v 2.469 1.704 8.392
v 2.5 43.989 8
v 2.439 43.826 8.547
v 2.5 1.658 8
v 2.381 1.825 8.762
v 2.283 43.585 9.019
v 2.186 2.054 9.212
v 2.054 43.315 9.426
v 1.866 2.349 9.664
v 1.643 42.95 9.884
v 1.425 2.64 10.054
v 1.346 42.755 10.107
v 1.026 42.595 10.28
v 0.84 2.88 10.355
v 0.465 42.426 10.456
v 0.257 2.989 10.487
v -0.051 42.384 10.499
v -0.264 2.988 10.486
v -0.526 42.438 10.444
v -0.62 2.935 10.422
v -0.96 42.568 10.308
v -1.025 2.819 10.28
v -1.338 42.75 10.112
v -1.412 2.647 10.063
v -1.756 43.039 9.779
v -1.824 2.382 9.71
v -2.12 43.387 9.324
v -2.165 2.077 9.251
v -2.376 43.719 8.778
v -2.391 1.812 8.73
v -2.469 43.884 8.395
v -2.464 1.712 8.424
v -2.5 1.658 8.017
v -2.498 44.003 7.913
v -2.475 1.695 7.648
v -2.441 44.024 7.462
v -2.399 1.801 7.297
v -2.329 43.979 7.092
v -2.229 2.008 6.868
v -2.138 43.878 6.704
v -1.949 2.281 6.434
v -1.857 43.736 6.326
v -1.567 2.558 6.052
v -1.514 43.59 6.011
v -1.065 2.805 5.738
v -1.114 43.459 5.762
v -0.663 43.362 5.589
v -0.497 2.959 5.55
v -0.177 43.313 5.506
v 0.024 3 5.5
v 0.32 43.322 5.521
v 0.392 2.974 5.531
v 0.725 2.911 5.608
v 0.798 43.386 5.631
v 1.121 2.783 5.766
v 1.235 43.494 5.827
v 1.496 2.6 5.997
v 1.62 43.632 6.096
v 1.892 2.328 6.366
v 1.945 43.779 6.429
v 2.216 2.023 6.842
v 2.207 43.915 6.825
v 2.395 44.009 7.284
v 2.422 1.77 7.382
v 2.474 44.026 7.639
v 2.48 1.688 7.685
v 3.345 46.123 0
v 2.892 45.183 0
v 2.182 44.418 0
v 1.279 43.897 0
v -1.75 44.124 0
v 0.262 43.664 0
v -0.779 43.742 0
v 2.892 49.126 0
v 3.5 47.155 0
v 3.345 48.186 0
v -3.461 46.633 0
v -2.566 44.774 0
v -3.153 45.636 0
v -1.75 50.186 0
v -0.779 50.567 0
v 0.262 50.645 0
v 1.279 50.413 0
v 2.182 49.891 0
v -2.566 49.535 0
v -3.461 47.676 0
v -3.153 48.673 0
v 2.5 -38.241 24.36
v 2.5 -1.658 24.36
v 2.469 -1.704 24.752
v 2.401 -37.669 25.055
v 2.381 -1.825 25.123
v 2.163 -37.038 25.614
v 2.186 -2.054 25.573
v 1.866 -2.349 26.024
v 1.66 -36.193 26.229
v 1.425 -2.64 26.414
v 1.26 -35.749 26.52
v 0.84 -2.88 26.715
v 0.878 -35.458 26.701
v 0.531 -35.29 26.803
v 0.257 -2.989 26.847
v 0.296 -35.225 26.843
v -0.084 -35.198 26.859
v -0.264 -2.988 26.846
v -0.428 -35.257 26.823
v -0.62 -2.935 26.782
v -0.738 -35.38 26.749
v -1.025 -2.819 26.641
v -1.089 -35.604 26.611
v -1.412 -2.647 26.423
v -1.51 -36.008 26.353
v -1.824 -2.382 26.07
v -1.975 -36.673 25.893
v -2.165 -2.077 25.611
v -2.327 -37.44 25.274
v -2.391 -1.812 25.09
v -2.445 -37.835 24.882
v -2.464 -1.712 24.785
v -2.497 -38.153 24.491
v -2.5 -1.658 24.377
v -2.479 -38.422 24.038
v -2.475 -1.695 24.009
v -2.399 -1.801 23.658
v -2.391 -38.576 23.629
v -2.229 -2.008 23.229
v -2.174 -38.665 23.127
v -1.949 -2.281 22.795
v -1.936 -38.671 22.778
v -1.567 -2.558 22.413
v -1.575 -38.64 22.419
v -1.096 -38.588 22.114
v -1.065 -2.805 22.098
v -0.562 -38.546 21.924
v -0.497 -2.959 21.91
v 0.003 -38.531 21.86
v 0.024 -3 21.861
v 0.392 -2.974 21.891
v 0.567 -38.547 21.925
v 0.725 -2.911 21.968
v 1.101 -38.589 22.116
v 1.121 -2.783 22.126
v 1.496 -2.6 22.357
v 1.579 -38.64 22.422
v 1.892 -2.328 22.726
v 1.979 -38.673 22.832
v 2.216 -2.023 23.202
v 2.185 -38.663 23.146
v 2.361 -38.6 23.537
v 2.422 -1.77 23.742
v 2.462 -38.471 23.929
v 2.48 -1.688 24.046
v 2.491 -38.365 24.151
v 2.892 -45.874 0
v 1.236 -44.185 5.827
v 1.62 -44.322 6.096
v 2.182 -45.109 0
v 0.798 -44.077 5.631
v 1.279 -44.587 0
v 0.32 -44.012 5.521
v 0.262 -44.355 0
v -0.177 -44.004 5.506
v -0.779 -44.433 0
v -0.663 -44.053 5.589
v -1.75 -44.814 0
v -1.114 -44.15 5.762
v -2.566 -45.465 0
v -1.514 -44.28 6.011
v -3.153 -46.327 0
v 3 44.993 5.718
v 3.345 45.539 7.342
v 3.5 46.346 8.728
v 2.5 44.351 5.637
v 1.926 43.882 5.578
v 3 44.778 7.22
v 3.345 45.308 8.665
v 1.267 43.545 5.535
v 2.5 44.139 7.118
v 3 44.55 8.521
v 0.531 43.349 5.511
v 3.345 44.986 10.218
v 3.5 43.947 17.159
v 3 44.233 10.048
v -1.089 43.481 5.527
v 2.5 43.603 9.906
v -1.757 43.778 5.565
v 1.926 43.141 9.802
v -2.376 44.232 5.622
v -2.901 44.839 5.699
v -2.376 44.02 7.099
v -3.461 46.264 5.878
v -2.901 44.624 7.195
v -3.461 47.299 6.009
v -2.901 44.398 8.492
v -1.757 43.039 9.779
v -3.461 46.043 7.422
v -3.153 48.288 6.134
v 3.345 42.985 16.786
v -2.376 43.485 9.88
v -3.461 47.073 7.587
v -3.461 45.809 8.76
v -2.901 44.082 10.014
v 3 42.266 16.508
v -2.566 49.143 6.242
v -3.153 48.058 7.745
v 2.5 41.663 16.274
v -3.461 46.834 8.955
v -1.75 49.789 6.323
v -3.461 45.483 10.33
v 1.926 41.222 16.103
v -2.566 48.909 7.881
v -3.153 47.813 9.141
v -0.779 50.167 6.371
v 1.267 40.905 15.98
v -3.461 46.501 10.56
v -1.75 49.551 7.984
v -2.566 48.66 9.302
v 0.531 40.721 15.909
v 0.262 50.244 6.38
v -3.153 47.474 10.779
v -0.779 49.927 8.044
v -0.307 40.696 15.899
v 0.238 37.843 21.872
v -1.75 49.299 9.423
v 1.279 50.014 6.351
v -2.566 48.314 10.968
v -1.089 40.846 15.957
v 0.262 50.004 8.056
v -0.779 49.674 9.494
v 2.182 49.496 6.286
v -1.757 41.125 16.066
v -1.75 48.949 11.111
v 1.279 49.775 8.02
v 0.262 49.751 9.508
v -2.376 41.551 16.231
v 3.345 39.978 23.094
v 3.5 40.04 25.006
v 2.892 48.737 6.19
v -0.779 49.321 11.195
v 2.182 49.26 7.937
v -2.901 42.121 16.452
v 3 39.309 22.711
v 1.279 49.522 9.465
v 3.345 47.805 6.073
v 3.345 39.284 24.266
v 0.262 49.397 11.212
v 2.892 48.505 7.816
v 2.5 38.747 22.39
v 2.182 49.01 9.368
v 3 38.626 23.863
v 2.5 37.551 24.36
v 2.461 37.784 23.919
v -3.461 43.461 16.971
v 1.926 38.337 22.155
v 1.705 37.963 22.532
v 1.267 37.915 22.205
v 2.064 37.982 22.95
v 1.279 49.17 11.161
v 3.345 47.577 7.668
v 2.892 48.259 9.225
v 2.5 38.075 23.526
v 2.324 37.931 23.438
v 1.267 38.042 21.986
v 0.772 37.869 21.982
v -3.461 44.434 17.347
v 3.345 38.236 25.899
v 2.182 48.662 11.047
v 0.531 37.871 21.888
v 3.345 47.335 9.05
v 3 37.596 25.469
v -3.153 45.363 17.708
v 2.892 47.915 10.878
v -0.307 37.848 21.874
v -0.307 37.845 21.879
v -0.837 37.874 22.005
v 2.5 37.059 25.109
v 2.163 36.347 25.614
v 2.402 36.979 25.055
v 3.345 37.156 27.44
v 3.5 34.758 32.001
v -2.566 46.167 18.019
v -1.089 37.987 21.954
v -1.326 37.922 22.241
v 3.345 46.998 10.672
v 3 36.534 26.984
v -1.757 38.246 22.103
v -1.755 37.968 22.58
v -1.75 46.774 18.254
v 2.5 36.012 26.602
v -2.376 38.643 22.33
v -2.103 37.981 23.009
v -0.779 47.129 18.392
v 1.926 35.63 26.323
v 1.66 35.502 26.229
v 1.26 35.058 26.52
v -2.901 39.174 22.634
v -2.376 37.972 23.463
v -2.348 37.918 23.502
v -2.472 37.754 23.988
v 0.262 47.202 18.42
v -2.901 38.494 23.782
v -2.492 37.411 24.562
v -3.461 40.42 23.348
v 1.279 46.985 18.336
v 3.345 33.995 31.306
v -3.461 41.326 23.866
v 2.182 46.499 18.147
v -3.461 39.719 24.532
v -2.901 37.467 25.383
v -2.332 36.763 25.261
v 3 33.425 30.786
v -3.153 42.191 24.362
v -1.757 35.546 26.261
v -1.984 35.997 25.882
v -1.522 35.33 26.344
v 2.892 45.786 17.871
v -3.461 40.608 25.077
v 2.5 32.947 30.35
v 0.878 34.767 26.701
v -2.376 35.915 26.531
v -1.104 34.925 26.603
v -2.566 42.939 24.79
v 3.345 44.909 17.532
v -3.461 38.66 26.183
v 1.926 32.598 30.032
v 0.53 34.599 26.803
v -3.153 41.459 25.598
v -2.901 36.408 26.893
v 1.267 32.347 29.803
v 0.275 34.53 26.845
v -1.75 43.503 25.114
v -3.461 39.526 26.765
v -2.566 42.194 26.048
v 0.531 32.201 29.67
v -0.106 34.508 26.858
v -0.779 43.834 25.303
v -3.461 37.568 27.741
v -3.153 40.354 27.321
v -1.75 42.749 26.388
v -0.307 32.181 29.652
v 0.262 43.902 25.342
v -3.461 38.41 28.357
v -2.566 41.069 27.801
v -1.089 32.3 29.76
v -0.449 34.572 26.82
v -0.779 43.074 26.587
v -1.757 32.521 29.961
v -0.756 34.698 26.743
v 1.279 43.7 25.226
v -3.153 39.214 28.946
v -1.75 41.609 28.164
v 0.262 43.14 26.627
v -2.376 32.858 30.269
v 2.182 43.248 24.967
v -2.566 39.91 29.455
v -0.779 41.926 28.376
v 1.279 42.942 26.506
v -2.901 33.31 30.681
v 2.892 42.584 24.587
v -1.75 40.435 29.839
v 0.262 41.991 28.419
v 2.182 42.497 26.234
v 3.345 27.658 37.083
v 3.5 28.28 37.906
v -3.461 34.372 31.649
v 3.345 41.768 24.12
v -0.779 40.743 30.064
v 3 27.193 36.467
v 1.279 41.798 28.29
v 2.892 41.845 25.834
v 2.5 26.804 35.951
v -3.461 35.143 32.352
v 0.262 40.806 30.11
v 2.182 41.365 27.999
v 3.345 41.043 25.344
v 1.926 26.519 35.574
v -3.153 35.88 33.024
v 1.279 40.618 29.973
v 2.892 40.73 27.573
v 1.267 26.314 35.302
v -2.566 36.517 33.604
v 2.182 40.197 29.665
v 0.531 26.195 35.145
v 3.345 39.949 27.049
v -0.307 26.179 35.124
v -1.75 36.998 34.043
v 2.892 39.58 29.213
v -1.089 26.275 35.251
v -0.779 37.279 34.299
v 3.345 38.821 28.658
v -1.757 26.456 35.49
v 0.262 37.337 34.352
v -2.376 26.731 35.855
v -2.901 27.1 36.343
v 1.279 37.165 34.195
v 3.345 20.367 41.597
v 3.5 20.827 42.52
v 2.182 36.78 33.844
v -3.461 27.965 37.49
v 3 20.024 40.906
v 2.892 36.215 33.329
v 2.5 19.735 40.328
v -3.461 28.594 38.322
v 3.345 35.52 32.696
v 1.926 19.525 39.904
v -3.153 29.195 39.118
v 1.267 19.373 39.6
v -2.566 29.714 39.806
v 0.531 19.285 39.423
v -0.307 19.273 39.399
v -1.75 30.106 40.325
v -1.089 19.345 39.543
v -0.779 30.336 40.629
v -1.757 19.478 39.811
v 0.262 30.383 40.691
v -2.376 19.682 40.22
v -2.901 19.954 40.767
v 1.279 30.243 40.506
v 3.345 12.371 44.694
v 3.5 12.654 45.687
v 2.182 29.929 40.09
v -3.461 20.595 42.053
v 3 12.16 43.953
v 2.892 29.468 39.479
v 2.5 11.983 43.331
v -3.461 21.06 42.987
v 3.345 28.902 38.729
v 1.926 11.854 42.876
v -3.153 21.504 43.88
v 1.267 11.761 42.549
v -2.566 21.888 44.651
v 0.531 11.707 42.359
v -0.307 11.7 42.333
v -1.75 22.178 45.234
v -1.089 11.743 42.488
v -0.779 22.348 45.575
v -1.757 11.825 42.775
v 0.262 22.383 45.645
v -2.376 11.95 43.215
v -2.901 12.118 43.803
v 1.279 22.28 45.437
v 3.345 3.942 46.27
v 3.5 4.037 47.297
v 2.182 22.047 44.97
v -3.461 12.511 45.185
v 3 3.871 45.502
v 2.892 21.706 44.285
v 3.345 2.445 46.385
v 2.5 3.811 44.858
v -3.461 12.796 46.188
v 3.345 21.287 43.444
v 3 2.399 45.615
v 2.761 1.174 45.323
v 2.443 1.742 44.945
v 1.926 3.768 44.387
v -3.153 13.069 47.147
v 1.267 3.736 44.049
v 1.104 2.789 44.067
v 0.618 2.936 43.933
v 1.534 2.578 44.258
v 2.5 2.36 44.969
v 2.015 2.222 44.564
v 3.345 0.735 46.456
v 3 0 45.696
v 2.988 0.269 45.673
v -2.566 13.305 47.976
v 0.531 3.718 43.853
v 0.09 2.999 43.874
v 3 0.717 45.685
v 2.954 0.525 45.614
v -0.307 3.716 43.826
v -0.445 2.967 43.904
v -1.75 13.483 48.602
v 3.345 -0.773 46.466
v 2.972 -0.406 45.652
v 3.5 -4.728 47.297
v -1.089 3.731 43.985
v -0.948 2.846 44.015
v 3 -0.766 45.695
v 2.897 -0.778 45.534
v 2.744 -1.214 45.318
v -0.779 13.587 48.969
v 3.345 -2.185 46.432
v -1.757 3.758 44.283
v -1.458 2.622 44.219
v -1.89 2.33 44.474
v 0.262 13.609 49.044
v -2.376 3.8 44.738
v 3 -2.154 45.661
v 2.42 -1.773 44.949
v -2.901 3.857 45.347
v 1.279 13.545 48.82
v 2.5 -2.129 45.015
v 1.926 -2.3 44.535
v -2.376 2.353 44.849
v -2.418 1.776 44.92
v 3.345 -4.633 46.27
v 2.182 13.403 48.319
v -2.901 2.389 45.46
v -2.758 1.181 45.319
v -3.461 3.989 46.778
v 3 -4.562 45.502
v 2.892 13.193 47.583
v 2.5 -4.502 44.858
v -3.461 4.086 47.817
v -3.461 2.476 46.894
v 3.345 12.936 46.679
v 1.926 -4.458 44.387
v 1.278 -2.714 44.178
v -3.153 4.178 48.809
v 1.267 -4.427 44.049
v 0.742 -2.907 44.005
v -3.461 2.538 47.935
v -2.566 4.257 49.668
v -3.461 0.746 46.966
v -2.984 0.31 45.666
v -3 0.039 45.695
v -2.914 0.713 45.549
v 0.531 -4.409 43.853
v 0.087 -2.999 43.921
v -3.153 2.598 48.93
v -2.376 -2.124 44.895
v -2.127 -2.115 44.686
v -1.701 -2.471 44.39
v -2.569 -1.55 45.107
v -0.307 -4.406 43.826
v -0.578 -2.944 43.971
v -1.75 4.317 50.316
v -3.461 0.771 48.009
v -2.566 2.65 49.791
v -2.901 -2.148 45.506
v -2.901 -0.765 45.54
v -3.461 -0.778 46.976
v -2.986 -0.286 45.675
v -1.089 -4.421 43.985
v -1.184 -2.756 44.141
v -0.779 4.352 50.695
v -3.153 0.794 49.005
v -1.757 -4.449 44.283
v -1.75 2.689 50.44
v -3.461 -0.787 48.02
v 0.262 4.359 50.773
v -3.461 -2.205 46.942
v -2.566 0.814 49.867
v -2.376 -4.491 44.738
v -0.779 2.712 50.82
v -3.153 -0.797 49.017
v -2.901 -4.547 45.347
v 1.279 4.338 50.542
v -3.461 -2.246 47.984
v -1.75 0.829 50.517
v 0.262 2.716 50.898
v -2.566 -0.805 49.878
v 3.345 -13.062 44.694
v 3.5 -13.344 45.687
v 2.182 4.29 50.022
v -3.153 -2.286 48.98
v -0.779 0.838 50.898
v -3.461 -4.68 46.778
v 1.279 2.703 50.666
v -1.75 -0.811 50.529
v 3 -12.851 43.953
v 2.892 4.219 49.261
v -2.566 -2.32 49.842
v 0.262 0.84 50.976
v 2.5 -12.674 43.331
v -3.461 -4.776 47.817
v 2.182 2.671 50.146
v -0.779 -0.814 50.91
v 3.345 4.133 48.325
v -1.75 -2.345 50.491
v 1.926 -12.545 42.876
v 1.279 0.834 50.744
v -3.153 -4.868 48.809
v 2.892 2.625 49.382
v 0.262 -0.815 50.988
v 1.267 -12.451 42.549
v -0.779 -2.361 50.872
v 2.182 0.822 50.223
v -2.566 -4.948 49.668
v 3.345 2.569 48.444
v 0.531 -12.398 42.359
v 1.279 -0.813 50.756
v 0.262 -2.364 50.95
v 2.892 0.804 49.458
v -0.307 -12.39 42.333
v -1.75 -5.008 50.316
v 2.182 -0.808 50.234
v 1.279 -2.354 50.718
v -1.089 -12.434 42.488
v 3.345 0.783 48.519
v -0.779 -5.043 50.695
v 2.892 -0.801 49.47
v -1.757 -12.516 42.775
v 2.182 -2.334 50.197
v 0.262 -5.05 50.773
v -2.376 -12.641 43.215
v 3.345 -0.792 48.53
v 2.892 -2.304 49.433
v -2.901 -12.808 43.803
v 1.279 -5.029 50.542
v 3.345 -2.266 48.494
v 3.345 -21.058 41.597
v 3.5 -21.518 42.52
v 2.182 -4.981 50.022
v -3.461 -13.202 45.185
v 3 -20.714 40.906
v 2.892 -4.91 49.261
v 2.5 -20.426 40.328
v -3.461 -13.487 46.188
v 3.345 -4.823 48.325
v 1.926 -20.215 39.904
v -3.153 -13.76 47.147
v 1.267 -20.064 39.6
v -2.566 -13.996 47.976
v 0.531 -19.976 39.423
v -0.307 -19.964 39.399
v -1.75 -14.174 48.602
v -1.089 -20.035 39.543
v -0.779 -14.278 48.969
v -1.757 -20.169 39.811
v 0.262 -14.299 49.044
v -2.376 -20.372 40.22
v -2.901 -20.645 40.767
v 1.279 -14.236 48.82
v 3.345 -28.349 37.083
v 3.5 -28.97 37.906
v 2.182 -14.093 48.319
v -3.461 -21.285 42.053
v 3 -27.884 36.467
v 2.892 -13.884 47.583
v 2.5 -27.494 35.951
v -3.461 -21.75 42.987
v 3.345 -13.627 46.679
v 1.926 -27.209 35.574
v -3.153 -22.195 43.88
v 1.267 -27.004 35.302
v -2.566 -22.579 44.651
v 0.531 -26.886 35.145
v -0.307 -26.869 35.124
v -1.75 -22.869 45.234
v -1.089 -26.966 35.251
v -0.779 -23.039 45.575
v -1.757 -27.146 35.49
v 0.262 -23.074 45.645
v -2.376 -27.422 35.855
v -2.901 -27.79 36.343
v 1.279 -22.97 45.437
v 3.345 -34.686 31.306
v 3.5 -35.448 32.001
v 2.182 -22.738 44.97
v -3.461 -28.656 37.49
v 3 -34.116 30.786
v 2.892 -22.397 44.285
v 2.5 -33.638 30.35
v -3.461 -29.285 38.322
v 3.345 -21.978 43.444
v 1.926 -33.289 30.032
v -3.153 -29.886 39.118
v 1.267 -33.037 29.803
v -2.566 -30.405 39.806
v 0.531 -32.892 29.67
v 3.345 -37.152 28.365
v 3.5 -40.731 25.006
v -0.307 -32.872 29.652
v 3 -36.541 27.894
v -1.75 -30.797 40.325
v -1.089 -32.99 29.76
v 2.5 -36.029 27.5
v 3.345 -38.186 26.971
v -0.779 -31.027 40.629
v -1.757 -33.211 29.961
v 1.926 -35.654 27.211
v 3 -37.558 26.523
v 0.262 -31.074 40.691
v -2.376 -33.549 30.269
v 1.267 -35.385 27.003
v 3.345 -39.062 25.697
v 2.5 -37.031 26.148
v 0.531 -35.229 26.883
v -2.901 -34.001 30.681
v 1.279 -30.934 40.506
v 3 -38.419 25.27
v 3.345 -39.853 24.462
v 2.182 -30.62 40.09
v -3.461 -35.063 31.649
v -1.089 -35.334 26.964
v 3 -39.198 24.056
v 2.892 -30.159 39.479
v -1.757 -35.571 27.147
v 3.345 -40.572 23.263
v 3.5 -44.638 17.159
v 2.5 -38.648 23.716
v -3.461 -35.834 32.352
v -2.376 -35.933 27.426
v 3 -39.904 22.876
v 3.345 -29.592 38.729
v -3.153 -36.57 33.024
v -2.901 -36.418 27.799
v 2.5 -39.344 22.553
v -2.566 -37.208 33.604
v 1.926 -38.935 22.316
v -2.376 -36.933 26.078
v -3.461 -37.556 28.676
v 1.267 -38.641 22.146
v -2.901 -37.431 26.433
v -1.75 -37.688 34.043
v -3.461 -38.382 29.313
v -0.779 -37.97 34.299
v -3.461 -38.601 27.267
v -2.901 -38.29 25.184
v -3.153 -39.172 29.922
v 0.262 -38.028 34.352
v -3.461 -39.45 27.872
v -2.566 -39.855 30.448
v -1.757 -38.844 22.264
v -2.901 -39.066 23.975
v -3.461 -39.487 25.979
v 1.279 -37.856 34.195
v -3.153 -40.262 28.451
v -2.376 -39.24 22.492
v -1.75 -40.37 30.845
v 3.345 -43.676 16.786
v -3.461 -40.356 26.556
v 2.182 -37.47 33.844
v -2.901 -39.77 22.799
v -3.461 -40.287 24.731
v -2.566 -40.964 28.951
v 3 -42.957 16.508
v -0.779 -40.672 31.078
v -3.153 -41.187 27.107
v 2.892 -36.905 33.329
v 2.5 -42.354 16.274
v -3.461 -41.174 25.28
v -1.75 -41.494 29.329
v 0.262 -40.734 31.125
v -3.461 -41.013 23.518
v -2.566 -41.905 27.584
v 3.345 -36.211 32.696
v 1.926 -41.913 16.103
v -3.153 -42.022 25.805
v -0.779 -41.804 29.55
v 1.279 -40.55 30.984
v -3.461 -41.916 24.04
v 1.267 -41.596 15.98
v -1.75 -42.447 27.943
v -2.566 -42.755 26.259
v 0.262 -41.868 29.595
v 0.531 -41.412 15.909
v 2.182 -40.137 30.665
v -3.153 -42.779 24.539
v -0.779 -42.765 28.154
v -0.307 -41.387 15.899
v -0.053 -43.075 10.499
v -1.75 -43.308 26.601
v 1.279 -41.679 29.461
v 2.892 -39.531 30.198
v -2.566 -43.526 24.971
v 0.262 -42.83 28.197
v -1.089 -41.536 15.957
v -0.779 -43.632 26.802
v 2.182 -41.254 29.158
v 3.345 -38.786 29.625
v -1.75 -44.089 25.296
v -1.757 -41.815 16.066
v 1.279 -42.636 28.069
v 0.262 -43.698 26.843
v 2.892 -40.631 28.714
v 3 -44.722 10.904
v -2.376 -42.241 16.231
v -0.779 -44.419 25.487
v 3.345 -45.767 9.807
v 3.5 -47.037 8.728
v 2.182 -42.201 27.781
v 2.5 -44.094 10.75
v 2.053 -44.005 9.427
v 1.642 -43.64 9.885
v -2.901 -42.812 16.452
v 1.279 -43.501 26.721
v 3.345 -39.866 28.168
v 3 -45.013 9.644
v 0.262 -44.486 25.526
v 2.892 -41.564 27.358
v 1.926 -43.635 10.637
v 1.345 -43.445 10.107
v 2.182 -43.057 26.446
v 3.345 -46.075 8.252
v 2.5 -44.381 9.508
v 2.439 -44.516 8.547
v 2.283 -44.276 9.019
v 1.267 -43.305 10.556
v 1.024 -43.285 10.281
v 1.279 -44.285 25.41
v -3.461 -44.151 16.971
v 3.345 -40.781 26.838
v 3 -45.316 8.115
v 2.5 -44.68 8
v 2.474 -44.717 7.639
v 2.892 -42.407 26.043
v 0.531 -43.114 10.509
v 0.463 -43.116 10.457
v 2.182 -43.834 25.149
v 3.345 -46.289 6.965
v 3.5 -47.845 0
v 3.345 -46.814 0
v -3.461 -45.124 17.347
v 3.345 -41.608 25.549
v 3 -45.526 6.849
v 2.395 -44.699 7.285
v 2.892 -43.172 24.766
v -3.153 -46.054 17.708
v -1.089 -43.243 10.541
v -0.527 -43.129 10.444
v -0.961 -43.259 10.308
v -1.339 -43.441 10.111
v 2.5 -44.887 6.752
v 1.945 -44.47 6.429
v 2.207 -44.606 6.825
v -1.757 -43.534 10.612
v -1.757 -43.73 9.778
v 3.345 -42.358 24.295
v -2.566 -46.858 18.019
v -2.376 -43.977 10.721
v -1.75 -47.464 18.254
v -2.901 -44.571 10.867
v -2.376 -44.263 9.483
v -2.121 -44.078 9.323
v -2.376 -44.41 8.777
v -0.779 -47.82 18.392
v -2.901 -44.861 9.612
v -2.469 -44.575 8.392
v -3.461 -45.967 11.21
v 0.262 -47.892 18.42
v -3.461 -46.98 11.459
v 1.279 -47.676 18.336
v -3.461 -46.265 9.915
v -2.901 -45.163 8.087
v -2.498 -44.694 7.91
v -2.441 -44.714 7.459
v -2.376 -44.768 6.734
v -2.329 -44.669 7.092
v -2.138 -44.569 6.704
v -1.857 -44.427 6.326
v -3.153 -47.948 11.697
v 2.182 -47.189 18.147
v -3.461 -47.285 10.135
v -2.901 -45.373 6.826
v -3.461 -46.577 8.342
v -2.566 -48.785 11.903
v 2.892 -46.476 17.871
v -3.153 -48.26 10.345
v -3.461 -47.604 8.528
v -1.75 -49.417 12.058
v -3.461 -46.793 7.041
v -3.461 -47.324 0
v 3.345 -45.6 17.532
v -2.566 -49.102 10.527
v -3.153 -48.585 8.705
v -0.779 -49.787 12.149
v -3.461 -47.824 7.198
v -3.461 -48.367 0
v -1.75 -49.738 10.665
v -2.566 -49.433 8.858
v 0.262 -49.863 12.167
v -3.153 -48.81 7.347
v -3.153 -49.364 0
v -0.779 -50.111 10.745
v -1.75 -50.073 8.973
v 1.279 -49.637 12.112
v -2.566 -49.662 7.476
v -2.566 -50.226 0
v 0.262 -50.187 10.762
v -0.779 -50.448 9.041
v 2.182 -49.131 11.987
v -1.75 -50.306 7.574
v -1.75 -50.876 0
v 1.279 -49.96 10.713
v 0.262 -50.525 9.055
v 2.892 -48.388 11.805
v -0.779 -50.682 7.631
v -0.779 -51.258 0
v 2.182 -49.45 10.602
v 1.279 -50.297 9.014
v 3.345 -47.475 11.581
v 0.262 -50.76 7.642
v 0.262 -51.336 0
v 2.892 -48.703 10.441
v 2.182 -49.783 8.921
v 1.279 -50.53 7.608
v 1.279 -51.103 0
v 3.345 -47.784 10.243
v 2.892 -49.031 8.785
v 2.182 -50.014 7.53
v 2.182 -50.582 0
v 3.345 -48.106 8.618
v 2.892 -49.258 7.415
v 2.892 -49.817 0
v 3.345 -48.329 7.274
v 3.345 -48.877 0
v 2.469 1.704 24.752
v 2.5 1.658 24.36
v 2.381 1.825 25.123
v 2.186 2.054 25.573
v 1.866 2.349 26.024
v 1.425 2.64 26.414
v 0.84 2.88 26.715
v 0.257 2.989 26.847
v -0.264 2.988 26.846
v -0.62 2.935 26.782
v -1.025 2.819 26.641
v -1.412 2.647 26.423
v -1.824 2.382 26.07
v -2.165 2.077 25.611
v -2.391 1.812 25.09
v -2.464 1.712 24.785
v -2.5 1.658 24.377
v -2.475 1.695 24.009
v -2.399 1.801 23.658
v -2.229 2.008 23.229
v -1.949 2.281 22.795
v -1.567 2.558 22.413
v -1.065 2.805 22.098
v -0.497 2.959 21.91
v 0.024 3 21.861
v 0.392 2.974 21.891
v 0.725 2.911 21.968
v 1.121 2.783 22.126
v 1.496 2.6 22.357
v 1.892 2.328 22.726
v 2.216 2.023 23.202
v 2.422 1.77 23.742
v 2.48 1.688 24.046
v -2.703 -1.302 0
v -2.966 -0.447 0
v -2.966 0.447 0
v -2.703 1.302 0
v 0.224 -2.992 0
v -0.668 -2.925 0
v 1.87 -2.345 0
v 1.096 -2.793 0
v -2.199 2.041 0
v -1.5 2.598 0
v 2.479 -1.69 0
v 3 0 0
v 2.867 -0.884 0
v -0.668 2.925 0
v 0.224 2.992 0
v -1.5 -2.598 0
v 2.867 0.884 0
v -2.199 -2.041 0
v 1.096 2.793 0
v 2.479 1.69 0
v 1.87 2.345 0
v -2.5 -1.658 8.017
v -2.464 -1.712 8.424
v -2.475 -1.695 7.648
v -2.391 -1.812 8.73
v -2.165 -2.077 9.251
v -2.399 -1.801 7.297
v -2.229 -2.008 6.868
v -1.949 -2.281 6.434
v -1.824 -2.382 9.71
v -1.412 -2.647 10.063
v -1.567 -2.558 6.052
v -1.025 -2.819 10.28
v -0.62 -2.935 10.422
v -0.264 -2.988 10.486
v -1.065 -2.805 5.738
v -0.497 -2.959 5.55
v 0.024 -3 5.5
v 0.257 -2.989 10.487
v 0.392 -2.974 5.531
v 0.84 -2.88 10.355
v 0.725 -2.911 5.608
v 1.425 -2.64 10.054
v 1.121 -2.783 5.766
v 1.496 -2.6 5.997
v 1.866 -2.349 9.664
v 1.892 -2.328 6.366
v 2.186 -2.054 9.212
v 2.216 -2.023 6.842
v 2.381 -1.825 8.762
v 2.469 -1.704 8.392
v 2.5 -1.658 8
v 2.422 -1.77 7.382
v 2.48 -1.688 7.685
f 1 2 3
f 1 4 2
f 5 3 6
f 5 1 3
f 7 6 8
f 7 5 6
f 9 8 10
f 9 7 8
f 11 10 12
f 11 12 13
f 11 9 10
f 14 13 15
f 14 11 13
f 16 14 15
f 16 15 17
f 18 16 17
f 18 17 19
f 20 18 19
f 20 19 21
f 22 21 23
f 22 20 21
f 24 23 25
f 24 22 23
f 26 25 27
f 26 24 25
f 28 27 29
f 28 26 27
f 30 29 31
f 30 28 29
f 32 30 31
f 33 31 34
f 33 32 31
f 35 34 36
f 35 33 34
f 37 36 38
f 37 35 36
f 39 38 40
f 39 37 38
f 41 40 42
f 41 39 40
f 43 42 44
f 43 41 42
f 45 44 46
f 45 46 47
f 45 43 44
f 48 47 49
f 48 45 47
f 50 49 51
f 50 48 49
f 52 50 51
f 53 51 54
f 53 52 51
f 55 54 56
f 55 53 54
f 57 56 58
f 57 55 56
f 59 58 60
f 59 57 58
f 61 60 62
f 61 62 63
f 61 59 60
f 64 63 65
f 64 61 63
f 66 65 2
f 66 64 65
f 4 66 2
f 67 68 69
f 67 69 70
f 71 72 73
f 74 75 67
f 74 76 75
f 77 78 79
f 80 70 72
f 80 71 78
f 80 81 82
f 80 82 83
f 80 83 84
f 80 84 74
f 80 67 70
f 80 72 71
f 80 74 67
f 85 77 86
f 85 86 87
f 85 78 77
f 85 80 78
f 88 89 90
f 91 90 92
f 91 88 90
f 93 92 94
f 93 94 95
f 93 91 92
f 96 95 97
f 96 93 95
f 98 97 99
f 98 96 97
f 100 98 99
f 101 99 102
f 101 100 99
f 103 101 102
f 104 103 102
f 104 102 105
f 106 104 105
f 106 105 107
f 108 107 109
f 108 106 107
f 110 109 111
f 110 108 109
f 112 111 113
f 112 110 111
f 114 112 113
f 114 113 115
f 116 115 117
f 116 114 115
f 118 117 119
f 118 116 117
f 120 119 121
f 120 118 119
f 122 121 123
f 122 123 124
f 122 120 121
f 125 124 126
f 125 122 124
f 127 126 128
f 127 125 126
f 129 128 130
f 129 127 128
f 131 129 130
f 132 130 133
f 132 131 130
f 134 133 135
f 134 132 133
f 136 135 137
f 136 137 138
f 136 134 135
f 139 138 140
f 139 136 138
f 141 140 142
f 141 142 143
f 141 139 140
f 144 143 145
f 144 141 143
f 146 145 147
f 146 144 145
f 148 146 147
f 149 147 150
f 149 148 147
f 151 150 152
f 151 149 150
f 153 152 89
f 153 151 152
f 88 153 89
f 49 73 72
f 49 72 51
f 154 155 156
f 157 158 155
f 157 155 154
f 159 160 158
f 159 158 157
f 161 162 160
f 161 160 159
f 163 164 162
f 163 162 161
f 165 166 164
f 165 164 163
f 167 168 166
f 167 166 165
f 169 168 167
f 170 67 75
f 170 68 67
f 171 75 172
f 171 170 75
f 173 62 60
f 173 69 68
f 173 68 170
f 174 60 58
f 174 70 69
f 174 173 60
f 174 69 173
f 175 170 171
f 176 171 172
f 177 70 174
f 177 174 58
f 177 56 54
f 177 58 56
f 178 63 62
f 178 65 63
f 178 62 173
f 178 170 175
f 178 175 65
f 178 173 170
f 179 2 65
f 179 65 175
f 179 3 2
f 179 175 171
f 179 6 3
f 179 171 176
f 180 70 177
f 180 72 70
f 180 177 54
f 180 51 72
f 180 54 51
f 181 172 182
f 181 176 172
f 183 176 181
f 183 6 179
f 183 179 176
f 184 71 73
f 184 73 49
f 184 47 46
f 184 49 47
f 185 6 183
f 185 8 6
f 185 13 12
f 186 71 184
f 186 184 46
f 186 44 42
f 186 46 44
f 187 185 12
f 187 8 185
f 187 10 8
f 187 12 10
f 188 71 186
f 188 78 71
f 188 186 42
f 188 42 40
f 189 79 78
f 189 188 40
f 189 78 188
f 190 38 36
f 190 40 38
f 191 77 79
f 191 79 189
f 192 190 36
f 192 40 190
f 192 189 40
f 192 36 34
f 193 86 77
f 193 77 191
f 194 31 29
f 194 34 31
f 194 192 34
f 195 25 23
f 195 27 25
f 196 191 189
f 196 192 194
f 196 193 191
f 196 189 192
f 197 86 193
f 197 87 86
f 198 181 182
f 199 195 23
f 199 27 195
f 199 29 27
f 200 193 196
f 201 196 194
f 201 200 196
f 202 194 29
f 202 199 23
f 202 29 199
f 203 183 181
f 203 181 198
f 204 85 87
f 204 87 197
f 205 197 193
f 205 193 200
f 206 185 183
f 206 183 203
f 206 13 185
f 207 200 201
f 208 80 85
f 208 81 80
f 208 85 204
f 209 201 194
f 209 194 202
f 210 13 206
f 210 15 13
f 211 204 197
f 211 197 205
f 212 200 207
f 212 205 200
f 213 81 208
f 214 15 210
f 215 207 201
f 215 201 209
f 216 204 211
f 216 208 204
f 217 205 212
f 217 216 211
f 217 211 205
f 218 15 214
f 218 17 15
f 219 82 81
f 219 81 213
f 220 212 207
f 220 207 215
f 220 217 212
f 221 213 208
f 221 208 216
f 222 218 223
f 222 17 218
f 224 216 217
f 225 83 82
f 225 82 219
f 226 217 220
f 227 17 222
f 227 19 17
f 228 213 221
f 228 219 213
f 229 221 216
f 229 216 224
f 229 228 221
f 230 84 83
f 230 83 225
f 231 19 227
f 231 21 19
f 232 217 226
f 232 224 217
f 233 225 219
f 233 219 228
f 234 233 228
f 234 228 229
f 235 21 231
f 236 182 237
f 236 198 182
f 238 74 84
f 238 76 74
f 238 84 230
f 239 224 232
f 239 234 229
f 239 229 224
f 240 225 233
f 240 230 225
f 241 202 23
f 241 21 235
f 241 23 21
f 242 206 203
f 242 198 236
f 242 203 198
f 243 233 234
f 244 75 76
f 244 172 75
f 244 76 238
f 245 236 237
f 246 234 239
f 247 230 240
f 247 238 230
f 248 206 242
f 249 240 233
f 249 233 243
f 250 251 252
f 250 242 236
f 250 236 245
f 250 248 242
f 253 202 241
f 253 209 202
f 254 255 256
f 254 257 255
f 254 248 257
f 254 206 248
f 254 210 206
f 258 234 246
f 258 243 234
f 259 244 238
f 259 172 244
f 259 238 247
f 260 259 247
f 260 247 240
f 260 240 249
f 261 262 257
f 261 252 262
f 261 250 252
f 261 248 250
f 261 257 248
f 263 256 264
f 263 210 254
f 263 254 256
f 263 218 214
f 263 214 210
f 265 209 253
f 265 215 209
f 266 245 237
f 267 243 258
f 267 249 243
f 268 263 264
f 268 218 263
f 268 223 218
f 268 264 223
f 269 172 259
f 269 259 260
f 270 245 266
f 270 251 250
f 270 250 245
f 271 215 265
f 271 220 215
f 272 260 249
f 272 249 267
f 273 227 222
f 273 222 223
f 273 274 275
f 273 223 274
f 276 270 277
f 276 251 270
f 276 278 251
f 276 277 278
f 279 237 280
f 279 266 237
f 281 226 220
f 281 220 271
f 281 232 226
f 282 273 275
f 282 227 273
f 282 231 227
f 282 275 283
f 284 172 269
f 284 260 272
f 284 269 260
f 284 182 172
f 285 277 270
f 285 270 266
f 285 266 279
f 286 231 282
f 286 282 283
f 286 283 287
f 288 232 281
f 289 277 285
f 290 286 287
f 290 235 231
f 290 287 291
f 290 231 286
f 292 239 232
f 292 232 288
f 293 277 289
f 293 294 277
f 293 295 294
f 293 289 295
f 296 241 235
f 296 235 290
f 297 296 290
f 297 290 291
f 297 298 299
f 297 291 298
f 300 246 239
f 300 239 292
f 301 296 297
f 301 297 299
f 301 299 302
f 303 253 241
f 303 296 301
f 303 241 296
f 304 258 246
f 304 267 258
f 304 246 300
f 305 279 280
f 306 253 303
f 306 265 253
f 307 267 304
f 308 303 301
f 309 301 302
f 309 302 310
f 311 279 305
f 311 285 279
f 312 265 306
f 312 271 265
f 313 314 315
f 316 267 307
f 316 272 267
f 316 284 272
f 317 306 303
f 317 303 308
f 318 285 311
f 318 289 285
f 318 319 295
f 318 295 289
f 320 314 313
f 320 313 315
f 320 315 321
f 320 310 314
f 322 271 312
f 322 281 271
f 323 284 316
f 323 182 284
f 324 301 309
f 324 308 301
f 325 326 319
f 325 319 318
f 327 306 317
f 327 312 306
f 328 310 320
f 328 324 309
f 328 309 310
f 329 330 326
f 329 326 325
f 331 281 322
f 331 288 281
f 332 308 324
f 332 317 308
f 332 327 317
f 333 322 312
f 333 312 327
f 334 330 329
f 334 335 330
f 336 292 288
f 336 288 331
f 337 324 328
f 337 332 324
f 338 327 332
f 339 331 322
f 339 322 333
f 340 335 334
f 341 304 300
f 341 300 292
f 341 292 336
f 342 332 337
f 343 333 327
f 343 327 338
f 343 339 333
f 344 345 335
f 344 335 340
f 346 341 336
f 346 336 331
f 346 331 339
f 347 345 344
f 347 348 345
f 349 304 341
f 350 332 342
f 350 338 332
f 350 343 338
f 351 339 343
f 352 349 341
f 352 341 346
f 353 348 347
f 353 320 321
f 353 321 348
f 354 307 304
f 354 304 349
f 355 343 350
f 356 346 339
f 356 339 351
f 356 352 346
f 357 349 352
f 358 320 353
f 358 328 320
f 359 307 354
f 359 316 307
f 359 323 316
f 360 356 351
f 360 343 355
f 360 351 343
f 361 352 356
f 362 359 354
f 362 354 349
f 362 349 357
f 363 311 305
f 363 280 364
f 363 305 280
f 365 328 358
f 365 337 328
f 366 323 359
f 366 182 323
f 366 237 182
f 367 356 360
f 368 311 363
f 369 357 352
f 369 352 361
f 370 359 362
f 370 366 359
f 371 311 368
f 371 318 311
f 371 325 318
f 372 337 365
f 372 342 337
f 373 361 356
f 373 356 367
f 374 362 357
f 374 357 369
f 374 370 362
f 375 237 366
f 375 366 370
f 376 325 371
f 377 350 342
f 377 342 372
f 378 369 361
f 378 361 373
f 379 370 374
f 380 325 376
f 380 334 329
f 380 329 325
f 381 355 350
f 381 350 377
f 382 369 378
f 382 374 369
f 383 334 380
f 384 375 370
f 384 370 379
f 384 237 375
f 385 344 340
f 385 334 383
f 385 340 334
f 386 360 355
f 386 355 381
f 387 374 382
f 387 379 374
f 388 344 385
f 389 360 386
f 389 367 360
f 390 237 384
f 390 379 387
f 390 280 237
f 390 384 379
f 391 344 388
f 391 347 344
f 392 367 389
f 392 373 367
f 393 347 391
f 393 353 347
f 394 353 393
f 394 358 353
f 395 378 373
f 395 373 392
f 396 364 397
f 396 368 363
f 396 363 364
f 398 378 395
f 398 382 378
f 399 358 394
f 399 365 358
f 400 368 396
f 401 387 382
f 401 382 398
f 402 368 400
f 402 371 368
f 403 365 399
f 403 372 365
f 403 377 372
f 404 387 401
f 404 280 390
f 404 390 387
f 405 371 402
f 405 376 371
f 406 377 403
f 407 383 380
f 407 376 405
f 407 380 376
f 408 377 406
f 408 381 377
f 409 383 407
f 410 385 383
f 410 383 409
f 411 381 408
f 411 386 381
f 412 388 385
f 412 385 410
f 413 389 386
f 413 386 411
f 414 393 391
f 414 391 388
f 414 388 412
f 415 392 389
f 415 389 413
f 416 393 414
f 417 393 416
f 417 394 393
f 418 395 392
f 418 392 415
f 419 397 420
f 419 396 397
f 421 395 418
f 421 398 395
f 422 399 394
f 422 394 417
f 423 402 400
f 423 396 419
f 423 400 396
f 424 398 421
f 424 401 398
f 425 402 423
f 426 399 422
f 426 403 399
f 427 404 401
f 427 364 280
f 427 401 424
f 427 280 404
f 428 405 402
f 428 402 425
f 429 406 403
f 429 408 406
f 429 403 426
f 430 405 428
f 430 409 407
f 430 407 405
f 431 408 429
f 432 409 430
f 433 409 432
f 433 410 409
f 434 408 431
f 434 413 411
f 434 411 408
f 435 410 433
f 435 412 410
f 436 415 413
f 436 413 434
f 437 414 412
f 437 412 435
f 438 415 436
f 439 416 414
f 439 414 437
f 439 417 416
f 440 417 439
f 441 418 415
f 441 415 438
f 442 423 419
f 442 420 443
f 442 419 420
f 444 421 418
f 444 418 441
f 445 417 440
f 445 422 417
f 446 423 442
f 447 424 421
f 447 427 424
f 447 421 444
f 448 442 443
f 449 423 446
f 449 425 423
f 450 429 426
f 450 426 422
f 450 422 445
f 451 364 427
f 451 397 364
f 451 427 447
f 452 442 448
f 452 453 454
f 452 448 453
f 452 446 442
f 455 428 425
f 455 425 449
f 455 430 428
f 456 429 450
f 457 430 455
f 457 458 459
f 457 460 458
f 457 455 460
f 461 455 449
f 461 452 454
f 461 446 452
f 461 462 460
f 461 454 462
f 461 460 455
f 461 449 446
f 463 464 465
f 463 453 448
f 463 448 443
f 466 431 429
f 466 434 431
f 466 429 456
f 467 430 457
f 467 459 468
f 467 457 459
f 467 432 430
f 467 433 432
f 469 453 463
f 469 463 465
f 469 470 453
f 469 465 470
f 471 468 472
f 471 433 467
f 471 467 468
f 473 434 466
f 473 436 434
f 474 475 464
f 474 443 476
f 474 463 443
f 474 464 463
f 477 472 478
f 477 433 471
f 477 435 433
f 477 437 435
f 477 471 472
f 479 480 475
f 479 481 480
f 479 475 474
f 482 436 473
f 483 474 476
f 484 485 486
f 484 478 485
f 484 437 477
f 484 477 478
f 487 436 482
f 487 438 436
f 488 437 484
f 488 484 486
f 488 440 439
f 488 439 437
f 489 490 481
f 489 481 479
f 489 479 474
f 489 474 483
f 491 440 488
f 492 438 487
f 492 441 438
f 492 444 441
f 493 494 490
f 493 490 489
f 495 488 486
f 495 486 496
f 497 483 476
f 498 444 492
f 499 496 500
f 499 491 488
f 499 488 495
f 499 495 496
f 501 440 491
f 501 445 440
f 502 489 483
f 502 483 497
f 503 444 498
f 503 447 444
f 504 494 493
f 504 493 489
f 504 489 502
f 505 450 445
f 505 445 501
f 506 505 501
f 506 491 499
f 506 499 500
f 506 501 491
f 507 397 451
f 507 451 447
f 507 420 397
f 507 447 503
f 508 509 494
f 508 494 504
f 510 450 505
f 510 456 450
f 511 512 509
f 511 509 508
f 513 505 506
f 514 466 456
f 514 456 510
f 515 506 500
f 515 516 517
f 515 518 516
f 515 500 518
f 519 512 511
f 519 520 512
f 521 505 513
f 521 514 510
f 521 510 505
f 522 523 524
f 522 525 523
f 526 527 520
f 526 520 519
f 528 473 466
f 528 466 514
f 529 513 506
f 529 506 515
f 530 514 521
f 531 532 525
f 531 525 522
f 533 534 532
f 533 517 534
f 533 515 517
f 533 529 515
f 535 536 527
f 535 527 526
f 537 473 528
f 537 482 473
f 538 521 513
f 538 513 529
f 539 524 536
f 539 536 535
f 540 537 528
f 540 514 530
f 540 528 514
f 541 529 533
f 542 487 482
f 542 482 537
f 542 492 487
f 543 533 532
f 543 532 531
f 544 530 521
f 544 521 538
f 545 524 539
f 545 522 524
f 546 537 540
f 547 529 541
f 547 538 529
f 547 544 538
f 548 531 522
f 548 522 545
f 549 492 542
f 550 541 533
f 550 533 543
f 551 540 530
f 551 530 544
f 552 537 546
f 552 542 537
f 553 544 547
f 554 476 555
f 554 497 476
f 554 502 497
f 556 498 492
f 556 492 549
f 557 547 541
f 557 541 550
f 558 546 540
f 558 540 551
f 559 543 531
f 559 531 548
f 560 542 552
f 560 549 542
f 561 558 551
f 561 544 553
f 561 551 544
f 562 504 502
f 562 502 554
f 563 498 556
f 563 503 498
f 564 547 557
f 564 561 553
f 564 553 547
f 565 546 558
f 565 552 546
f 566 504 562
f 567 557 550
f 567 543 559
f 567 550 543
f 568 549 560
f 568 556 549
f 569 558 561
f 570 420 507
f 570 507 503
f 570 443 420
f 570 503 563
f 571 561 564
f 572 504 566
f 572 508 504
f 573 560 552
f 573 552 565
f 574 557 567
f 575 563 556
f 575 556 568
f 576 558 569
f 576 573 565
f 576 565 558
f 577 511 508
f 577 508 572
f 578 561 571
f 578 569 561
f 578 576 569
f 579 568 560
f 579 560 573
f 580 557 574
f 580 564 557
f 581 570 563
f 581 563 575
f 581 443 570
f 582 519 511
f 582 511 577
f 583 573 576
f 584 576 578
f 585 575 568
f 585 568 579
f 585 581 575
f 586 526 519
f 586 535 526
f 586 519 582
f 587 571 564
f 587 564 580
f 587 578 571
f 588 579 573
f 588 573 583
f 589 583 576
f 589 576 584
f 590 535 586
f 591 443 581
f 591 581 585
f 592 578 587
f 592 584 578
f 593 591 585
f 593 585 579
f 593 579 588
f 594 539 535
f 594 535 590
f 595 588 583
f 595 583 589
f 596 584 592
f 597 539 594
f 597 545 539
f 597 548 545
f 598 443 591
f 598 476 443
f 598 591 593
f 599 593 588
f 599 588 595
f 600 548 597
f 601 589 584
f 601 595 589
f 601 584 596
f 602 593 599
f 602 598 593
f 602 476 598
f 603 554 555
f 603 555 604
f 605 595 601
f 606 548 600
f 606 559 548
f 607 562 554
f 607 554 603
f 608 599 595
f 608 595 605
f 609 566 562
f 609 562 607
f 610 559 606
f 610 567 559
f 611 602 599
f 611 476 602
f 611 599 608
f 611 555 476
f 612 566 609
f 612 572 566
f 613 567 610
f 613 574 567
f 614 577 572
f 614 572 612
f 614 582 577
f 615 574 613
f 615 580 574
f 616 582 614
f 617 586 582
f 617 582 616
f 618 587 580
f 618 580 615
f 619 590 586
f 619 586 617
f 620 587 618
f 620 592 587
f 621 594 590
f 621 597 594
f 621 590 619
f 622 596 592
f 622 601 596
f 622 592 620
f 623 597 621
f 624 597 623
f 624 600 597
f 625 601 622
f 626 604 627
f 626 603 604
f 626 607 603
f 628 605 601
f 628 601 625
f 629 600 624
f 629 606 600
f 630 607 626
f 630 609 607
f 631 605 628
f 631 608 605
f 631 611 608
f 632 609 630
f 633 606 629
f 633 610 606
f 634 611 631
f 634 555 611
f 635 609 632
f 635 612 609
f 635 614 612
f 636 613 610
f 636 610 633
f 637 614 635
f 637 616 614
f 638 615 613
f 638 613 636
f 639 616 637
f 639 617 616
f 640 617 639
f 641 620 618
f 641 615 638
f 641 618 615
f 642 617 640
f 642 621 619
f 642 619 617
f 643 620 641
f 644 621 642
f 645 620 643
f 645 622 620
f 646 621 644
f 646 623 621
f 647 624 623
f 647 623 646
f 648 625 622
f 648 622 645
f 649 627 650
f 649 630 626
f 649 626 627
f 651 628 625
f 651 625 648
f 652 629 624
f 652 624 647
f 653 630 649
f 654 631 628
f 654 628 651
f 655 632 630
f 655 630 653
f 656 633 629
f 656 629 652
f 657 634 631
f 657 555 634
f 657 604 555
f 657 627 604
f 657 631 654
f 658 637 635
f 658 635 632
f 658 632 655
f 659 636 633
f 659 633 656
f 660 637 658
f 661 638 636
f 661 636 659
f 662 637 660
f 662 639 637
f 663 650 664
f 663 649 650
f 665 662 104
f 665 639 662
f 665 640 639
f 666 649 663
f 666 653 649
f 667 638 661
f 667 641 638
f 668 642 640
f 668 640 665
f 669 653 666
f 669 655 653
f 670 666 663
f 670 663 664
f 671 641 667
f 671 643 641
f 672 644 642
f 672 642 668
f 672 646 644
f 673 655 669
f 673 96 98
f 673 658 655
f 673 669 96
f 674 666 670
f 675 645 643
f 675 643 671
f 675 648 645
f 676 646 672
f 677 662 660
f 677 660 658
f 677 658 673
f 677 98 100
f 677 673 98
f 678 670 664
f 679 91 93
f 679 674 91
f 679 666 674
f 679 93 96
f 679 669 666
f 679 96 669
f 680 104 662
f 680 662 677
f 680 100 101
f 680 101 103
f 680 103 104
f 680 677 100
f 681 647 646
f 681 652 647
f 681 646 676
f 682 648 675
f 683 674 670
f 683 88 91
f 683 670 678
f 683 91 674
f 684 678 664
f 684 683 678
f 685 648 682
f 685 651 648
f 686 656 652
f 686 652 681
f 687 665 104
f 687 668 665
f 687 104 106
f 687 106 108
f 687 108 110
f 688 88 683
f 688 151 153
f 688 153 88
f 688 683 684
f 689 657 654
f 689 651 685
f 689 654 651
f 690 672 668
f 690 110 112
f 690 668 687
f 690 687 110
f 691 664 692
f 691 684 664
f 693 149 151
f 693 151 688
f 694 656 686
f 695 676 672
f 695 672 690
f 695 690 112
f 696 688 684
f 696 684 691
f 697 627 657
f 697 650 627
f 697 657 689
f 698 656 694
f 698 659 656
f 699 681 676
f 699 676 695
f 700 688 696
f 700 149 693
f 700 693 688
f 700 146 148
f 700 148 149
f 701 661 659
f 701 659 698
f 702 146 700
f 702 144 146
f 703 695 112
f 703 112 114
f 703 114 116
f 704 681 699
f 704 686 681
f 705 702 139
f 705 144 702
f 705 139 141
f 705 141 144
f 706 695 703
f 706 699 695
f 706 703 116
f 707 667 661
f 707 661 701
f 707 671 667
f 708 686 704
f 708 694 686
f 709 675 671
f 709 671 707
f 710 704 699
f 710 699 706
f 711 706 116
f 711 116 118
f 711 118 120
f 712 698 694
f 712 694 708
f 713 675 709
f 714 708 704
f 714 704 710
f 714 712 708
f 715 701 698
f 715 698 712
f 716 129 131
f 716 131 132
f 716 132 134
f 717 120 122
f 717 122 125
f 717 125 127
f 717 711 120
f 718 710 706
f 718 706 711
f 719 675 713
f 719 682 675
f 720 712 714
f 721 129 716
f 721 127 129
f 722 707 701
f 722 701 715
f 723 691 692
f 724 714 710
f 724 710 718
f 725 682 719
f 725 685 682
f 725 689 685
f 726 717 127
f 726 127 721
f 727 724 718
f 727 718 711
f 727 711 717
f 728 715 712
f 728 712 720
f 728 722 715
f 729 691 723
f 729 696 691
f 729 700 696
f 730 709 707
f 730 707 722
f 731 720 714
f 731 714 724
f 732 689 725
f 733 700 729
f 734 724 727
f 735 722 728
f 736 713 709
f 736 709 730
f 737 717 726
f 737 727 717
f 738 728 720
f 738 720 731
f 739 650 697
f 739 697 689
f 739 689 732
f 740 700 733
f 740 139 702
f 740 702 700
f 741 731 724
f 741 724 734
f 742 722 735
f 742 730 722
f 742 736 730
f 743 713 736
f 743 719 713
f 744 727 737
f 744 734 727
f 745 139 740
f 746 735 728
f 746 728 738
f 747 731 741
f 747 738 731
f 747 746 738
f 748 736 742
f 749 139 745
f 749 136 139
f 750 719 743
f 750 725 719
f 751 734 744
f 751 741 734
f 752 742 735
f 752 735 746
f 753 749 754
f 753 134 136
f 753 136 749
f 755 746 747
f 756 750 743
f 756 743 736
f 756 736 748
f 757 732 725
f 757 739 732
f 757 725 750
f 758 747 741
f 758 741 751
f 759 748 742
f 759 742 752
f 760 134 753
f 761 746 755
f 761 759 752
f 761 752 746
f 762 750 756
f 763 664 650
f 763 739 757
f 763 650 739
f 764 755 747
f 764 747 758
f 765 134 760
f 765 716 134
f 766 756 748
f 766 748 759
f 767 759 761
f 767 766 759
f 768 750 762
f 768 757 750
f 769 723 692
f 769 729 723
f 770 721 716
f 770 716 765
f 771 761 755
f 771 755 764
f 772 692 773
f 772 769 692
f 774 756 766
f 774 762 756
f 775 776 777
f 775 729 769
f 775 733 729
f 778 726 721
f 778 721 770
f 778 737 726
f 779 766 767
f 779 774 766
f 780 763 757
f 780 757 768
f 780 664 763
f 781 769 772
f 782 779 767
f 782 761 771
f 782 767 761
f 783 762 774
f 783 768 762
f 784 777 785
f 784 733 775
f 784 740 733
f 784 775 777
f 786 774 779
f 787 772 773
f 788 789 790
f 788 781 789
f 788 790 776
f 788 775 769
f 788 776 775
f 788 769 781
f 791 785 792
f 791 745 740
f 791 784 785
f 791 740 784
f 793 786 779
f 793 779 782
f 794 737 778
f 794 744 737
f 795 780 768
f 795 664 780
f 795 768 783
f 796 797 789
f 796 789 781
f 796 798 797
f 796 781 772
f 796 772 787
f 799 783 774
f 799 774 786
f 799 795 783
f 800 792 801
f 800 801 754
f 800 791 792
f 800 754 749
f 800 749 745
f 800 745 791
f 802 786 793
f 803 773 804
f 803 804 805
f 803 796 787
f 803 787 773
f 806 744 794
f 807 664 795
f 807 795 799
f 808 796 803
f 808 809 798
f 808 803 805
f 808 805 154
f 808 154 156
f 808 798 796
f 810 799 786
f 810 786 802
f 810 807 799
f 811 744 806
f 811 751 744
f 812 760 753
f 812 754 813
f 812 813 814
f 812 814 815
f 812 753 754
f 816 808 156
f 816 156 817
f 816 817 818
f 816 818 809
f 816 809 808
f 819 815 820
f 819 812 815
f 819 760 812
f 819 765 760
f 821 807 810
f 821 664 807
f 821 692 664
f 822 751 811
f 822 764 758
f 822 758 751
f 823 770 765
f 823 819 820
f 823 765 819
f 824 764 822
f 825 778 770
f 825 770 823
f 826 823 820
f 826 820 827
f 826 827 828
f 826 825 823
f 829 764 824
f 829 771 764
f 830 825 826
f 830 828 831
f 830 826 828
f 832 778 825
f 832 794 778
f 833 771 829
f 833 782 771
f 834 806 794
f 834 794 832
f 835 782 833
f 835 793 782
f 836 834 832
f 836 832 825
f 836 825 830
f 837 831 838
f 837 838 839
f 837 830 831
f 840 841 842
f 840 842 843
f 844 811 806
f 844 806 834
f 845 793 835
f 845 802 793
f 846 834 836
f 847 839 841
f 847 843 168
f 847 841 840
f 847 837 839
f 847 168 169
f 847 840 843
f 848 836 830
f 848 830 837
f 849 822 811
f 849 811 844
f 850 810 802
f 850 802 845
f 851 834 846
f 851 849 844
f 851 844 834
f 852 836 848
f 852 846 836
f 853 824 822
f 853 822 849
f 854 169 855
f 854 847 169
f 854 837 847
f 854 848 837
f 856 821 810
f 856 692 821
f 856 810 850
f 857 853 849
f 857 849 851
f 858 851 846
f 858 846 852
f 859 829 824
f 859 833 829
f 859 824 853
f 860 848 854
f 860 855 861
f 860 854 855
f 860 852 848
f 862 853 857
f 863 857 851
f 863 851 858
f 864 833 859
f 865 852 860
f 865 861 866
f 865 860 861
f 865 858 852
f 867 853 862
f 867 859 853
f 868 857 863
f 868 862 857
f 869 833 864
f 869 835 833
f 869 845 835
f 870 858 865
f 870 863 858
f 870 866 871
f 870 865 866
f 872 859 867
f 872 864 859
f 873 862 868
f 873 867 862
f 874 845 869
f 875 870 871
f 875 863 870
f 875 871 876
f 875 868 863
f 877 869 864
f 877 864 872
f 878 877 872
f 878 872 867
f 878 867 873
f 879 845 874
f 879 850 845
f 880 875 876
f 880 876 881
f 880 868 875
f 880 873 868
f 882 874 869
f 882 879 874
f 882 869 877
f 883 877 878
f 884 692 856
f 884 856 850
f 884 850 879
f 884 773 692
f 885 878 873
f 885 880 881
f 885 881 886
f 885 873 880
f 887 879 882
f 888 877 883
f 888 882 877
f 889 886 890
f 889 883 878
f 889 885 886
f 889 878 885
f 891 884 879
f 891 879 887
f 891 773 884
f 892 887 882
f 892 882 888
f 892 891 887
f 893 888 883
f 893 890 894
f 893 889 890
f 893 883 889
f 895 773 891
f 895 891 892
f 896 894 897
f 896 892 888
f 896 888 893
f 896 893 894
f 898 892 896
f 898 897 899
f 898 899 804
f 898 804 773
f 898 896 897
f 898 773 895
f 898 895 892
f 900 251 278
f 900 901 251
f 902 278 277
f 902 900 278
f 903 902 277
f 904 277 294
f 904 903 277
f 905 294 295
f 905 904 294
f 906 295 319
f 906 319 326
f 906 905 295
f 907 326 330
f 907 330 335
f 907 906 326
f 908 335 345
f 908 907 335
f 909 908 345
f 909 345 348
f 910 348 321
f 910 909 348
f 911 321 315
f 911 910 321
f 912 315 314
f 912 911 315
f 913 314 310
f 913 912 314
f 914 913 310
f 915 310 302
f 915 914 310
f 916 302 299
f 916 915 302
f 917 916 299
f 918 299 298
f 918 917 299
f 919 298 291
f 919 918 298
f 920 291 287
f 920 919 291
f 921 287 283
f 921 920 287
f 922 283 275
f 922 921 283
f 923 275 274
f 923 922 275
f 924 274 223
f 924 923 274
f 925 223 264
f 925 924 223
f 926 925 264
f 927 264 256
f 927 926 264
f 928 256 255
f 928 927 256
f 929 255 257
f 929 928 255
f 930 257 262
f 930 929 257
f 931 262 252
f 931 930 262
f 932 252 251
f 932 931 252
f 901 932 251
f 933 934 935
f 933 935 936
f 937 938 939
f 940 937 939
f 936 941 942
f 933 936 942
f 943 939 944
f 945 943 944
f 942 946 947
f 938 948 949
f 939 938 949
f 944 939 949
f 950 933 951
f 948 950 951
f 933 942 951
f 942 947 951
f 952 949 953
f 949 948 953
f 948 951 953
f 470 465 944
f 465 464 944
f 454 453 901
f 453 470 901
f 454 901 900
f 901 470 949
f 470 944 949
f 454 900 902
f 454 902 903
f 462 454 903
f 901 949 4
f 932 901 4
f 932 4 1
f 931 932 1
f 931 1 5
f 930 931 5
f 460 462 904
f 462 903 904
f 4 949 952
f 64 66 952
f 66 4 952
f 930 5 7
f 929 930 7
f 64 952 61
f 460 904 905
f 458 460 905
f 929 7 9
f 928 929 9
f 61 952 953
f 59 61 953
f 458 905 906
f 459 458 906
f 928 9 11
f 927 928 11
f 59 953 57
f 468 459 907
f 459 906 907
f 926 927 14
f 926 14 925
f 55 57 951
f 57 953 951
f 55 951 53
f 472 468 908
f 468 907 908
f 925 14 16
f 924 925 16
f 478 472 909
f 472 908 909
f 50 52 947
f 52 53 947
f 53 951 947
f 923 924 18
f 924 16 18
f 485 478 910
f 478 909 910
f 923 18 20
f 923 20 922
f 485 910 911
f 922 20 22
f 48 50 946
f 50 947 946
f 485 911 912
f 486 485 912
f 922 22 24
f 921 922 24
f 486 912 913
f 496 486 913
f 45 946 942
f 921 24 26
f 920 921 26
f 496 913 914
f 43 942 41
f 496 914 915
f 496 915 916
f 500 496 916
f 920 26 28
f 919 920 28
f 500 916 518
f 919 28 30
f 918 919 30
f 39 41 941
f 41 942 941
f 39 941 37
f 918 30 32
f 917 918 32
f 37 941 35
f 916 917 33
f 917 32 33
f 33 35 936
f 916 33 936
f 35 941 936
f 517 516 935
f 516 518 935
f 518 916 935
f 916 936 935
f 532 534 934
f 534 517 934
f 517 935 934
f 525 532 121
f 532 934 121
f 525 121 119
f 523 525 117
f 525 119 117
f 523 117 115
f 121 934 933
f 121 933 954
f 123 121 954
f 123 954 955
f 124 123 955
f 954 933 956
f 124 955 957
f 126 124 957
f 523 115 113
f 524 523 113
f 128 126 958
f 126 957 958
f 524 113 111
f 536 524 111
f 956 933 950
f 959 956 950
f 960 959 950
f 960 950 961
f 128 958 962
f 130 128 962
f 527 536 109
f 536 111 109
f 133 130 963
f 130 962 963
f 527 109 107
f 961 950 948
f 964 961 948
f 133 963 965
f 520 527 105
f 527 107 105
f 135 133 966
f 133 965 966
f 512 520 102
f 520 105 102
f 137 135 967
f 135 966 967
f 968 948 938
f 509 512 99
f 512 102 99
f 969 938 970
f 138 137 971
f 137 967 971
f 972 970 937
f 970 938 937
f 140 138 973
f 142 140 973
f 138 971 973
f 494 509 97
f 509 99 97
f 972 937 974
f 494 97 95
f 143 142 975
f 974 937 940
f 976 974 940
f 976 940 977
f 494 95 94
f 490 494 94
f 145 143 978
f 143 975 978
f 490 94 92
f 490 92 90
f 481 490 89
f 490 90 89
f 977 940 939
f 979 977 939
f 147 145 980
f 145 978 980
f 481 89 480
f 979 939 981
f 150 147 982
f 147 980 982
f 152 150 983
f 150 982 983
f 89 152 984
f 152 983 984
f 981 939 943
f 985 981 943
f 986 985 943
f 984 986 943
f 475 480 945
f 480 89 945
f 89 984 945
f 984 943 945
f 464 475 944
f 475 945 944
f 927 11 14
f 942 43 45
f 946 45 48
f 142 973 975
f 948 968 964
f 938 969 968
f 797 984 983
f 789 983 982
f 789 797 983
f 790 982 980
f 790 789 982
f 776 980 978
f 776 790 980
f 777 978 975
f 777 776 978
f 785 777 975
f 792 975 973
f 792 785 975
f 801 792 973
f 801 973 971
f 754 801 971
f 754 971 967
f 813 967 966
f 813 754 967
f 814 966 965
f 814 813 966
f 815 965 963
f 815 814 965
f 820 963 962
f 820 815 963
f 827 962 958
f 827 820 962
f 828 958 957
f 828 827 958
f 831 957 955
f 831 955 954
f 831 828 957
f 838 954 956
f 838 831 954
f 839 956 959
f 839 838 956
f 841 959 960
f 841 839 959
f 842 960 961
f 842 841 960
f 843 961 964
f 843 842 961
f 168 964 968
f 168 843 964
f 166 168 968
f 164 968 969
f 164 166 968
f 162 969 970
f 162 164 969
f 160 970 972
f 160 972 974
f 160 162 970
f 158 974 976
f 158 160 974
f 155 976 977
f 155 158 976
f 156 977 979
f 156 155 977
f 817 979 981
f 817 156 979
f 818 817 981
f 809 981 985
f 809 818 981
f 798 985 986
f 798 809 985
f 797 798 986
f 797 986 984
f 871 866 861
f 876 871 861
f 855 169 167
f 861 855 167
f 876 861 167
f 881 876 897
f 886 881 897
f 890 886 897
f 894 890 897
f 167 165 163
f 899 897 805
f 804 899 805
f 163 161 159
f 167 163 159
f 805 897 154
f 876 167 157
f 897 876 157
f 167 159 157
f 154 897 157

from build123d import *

# Parameters (mm, degrees)
F1_R     = 3.5
F3_R     = 3
F4_DEPTH = 46
F5_R     = 2.5
F6_DEPTH = 40.5
F7_R     = 2.5
F8_DEPTH = 45


with BuildPart() as f2:
    # F2: sweep along a path in F0
    with BuildLine(Plane.YZ) as f2_path:
        ThreePointArc((44.654696, 0), (-0.345304, 45), (-45.345304, 0))
    # F1 (on Top) → F2 (sweep)
    with BuildSketch(Plane.XY):
        with Locations((0, -47.845304)):
            Circle(F1_R)
    sweep(path=f2_path.line)

    # F3 (on Top) → F4 (join)
    with BuildSketch(Plane.XY):
        Circle(F3_R)
    extrude(amount=F4_DEPTH)

    # F5 (on Front) → F6 (join, symmetric)
    with BuildSketch(Plane.XZ):
        with Locations((0, 24.36039)):
            Circle(F5_R)
    extrude(amount=F6_DEPTH, both=True)

    # F7 (on Front) → F8 (join, symmetric)
    with BuildSketch(Plane.XZ):
        with Locations((0, 8)):
            Circle(F7_R)
    extrude(amount=F8_DEPTH, both=True)


solid = f2.part
